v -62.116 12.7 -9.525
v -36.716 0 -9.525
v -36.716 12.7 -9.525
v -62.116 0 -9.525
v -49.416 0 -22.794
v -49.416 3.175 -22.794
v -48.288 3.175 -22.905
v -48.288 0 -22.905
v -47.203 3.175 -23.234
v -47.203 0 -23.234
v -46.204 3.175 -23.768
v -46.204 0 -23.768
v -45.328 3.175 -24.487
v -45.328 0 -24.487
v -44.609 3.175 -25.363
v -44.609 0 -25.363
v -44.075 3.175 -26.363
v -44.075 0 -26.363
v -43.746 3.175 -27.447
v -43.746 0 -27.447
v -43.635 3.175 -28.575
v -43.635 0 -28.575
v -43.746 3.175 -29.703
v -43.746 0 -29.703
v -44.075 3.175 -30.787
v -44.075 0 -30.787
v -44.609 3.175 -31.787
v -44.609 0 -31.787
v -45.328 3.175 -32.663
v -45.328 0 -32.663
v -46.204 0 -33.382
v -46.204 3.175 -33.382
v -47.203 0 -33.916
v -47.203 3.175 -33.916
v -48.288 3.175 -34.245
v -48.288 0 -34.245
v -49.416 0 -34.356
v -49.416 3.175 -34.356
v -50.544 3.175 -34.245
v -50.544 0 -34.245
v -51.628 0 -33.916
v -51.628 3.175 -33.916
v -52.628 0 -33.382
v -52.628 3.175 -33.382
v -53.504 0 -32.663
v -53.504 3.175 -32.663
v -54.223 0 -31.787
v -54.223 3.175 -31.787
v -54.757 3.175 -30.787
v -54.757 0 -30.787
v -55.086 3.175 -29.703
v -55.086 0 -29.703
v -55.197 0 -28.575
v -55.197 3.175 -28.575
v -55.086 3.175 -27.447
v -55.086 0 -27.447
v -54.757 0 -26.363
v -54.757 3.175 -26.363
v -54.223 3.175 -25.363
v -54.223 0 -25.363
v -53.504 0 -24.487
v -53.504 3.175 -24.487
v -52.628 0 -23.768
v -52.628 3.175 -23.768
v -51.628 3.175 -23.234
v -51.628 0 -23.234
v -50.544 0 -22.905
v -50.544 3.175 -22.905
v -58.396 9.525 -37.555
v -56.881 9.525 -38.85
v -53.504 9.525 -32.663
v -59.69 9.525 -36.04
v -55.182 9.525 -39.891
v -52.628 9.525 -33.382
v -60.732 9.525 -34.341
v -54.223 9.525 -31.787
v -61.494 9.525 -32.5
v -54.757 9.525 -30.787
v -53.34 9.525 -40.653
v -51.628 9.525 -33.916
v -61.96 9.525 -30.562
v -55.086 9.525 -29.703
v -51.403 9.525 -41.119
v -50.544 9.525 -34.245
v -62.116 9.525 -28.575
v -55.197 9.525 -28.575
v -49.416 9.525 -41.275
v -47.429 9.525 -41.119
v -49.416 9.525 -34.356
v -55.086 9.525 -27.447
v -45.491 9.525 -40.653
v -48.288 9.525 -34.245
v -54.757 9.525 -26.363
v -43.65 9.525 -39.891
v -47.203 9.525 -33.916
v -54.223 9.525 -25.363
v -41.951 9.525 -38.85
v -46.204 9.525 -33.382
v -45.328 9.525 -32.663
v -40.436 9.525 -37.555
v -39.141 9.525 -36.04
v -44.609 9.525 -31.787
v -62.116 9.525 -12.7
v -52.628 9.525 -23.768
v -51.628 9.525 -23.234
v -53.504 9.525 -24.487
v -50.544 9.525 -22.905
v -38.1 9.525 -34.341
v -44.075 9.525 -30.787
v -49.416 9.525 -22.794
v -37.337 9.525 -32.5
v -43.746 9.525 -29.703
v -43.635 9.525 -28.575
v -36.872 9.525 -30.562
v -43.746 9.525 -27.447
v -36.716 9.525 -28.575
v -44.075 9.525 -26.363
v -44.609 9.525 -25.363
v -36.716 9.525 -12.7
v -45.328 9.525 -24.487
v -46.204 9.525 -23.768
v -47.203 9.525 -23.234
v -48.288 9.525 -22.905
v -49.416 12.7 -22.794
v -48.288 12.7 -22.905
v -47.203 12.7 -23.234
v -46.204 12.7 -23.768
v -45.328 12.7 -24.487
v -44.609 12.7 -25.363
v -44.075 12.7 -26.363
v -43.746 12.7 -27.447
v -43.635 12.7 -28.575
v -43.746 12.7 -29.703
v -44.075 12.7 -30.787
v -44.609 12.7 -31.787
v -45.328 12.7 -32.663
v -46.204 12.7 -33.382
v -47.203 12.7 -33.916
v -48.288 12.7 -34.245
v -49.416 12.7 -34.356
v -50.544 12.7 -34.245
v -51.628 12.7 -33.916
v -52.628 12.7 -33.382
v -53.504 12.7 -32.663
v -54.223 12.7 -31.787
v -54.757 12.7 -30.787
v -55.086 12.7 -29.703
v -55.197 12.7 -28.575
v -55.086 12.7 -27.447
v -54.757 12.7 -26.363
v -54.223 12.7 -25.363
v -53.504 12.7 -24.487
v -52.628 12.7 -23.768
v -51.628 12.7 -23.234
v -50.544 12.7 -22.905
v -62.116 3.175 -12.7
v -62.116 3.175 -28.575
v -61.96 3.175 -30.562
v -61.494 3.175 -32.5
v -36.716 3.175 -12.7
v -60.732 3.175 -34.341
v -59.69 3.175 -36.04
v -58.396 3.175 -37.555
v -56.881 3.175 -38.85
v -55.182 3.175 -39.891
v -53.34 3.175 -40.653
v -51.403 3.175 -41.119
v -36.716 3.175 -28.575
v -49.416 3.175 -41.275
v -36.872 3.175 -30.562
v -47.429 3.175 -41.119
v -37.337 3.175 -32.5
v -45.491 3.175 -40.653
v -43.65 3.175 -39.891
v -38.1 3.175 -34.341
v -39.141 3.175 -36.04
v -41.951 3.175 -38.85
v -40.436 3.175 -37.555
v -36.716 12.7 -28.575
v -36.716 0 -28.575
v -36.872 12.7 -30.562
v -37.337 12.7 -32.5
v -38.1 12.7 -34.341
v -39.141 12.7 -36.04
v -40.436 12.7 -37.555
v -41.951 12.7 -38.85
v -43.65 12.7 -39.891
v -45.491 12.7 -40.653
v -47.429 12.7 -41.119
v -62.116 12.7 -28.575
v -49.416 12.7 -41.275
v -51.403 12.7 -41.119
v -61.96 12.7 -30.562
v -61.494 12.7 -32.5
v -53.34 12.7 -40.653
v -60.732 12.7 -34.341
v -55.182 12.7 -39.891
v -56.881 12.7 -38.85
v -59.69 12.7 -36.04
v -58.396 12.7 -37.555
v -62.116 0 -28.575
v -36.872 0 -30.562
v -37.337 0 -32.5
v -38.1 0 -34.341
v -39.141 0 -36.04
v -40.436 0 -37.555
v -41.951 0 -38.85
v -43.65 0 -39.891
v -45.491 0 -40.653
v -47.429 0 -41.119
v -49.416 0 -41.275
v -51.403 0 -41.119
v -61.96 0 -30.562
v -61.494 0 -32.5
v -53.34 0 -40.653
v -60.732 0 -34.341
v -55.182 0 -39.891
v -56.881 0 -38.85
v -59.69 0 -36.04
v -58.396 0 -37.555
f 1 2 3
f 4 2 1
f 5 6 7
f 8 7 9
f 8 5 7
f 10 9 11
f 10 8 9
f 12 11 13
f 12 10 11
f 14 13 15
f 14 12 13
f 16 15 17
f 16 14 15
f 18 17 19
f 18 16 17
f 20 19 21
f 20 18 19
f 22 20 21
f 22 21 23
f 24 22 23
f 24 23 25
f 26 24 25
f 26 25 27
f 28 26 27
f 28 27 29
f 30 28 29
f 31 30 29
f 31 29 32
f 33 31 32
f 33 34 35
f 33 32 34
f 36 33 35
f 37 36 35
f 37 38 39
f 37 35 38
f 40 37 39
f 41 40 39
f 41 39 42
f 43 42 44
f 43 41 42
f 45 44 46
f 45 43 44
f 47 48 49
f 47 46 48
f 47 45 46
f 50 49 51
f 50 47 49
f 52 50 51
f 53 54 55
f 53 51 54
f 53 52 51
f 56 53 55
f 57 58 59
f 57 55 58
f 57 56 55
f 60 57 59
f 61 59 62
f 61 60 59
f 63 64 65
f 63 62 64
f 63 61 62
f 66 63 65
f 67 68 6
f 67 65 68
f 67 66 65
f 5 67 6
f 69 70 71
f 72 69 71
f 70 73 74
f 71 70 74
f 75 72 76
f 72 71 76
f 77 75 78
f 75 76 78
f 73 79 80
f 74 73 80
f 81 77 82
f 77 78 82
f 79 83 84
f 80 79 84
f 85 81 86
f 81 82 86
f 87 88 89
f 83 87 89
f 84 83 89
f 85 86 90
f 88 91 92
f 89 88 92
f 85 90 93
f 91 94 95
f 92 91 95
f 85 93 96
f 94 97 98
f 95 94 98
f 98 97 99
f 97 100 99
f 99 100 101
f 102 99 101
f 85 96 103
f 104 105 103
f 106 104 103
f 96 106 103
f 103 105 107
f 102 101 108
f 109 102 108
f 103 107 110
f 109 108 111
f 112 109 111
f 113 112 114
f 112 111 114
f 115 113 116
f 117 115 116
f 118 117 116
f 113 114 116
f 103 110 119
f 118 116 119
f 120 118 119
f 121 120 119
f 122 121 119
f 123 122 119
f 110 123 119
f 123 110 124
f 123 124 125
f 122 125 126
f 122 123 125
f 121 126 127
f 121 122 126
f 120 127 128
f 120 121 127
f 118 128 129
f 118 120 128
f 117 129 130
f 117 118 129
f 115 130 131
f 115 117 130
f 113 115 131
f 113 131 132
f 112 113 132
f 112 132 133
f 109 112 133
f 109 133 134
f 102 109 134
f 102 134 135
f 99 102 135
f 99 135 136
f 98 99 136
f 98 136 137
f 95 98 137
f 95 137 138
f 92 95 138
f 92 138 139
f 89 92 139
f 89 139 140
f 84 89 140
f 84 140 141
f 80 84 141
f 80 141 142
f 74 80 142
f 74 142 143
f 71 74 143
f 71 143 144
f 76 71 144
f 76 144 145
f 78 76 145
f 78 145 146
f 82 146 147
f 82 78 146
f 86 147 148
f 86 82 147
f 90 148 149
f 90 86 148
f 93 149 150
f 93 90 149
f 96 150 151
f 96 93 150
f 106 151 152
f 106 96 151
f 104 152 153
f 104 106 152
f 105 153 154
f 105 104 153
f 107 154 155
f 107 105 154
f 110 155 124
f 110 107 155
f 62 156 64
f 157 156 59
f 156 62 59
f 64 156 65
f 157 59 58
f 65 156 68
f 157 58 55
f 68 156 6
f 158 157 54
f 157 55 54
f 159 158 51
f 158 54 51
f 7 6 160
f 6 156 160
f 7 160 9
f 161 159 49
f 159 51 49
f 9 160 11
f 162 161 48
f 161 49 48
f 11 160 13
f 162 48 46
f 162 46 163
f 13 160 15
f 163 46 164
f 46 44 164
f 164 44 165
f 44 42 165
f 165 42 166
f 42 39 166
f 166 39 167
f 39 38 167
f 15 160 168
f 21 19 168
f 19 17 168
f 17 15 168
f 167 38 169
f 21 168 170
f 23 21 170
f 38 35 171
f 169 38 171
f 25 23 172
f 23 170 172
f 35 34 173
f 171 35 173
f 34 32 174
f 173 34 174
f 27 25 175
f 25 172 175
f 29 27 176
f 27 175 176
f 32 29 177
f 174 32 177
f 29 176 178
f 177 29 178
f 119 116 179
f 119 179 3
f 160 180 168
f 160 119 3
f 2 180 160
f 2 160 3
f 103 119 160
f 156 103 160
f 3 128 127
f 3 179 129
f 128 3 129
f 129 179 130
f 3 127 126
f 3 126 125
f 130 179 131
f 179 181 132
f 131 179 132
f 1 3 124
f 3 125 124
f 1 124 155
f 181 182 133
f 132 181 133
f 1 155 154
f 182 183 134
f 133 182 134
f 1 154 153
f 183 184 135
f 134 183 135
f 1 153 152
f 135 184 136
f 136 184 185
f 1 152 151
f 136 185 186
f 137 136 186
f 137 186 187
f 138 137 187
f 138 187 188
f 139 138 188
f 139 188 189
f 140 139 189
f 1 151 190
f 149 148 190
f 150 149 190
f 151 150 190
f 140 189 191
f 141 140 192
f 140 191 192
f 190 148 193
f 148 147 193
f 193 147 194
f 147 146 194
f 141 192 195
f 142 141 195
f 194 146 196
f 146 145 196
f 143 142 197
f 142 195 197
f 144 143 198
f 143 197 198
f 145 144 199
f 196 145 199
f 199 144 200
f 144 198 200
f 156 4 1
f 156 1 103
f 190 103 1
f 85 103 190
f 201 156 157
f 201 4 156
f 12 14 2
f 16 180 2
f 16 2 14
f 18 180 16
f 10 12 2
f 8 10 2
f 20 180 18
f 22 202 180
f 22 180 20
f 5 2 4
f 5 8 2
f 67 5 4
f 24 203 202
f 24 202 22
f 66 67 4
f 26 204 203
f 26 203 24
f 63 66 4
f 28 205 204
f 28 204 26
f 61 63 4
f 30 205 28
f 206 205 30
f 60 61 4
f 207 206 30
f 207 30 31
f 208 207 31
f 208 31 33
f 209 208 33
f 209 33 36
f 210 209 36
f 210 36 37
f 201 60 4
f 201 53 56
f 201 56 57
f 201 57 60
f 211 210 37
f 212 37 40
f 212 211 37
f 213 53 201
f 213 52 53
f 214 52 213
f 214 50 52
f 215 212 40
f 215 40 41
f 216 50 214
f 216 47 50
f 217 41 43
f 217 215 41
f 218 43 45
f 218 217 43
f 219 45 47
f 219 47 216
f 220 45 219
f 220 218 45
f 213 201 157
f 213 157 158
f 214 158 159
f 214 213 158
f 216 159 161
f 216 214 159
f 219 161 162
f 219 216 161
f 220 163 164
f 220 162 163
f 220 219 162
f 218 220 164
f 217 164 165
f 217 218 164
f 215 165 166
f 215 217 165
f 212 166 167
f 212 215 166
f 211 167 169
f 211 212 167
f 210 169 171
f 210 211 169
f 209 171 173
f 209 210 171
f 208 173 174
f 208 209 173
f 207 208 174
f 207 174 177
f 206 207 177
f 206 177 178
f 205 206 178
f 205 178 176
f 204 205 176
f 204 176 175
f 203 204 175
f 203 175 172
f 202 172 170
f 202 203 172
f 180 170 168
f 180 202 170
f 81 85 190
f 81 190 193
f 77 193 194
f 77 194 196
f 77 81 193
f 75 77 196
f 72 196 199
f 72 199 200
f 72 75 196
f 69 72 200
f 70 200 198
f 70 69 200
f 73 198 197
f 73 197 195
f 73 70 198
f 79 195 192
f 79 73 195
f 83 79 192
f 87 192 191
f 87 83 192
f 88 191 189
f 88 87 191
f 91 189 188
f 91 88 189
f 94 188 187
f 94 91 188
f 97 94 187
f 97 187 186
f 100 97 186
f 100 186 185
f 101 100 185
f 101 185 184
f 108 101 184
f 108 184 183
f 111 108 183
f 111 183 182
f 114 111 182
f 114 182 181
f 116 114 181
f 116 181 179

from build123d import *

# Parameters (mm, degrees)
SKETCH1_R           = 5.78131598
BOSS_EXTRUDE1_DEPTH = 12.7
SKETCH2_W           = 28.575
SKETCH2_H           = 6.35
CUT_EXTRUDE1_DEPTH  = 33.528


with BuildPart() as part:
    # Sketch1 → Boss-Extrude1 (new body)
    with BuildSketch(Plane(origin=(0, 0, 0), x_dir=(1, 0, 0), z_dir=(0, 1, 0))):
        with BuildLine():
            Line((-36.7158591, 9.525), (-62.1158591, 9.525))
            Line((-62.1158591, 9.525), (-62.1158591, 28.575))
            ThreePointArc((-62.1158591, 28.575), (-49.4158591, 41.275), (-36.7158591, 28.575))
            Line((-36.7158591, 28.575), (-36.7158591, 9.525))
        make_face()
        with Locations((-49.4158591, 28.575)):
            Circle(SKETCH1_R, mode=Mode.SUBTRACT)
    extrude(amount=BOSS_EXTRUDE1_DEPTH)

    # Sketch2 → Cut-Extrude1 (cut)
    with BuildSketch(Plane(origin=(-36.7158591, 0, 0), x_dir=(0, 0, -1), z_dir=(1, 0, 0))):
        with Locations((26.9875, 6.35)):
            Rectangle(SKETCH2_W, SKETCH2_H)
    extrude(amount=-CUT_EXTRUDE1_DEPTH, mode=Mode.SUBTRACT)


solid = part.part
